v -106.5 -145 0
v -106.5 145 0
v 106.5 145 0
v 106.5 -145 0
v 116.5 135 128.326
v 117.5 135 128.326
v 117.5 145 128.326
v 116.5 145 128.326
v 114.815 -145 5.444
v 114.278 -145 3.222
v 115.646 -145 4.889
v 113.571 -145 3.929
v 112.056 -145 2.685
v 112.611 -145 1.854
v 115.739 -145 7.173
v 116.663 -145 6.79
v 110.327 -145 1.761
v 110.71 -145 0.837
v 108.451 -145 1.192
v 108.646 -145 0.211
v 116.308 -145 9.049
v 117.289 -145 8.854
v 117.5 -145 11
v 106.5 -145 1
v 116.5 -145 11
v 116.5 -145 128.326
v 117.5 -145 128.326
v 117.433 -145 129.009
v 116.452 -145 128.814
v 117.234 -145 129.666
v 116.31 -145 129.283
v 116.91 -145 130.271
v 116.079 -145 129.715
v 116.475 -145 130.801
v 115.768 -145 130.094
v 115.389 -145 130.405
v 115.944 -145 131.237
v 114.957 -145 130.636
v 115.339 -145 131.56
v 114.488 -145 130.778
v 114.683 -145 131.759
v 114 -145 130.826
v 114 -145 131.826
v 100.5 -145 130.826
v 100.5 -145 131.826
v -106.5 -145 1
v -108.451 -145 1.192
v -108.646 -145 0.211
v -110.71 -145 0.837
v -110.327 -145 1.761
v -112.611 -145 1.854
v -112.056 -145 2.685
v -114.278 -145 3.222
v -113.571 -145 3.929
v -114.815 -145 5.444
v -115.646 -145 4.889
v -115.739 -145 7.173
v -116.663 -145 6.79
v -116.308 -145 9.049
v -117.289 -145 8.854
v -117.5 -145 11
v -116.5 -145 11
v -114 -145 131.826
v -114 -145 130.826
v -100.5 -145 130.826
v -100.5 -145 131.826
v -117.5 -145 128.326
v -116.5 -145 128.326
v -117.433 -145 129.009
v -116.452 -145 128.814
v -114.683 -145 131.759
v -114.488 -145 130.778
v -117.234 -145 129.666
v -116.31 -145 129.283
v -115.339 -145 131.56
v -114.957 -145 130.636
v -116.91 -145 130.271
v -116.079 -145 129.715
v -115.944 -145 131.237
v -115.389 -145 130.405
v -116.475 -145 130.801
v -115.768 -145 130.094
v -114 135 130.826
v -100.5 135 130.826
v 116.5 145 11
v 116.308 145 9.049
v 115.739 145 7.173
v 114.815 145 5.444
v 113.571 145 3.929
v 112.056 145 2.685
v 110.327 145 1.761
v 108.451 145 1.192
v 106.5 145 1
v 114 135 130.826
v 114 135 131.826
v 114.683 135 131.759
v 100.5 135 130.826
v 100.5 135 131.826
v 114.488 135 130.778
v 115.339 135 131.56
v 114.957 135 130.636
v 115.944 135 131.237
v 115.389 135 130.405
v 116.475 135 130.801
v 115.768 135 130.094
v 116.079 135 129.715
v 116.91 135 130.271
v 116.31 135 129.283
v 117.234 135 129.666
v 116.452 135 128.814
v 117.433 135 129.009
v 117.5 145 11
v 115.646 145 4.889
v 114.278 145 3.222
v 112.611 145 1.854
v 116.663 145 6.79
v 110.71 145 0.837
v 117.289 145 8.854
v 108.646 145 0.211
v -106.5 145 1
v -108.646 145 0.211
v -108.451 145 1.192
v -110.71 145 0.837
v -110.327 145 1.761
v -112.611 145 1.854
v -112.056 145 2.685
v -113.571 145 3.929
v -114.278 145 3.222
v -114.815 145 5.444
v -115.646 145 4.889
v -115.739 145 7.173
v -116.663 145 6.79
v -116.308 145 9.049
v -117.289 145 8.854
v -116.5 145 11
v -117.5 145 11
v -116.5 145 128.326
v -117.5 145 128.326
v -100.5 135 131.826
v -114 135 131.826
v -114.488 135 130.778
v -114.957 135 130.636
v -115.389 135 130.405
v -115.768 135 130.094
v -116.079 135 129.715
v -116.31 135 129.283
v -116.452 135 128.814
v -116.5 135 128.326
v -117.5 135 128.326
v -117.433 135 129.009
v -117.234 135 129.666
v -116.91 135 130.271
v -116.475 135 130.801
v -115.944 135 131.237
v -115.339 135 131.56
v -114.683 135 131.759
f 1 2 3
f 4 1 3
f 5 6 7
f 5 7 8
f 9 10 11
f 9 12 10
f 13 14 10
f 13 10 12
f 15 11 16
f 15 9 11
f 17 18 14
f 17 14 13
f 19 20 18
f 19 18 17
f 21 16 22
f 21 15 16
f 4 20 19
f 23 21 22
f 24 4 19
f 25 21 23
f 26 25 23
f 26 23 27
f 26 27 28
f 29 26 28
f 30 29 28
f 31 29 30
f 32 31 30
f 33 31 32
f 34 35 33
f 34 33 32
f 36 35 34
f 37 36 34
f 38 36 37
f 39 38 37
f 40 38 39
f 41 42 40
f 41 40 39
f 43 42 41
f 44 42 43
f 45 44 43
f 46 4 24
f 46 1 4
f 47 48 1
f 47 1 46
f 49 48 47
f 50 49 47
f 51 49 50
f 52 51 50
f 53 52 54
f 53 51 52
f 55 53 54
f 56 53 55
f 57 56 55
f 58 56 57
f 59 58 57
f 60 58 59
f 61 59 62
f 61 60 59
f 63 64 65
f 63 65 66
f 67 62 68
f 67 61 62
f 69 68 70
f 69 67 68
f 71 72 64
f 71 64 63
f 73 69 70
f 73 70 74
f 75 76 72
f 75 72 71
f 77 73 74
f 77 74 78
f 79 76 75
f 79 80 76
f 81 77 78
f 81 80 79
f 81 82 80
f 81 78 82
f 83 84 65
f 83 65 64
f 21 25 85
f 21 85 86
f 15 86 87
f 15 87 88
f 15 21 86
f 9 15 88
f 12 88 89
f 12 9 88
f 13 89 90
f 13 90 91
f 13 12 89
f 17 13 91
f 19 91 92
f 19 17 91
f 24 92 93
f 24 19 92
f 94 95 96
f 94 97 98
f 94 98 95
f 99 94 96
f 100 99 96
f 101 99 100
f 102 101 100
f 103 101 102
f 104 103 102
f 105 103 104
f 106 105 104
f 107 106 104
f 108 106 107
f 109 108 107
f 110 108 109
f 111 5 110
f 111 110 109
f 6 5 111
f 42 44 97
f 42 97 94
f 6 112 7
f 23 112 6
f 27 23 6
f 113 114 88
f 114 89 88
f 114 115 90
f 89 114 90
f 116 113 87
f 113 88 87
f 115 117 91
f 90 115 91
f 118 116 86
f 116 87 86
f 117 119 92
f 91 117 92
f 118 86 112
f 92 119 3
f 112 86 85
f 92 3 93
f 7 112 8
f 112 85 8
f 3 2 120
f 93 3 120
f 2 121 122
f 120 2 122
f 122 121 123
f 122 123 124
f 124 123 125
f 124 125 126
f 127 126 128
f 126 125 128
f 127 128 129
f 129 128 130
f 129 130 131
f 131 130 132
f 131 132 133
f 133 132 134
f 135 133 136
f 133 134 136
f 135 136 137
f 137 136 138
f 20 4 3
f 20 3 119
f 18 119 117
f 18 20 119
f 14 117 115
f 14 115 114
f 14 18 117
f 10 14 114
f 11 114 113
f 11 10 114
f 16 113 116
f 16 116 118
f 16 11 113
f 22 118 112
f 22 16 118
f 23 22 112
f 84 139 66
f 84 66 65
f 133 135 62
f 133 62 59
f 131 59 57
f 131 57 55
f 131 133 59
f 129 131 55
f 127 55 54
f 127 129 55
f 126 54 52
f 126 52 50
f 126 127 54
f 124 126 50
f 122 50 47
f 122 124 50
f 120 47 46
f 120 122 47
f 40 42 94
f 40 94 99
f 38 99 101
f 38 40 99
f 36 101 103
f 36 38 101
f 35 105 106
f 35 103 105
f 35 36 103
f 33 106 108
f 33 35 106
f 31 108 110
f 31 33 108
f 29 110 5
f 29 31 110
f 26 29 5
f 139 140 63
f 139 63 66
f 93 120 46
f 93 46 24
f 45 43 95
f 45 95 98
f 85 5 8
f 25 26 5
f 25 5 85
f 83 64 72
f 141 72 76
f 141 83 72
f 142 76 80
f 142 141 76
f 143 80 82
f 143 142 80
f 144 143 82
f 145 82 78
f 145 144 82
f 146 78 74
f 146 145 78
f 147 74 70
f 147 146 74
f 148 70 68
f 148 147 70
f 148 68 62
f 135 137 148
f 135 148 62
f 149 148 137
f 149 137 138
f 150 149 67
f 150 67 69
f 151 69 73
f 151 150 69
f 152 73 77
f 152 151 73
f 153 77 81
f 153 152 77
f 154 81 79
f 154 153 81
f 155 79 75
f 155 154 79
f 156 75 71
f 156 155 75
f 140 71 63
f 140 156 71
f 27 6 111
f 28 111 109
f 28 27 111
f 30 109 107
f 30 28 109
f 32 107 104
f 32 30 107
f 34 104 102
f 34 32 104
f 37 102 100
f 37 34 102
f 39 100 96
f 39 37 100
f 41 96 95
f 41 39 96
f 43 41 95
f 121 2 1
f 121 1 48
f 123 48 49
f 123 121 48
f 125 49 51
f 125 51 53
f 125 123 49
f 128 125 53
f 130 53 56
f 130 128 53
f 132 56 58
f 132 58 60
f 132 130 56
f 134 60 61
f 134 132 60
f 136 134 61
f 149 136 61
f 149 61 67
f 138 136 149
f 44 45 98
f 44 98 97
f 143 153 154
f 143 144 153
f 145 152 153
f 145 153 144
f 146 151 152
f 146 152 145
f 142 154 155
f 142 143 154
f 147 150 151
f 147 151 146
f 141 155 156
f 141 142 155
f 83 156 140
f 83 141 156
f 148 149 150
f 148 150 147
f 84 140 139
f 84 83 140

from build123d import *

# Parameters (mm, degrees)
SKETCH1_W                      = 235
SKETCH1_H                      = 1
BASE_FLANGE1_DEPTH             = 145
EDGE_FLANGE2_STRIP_W           = 24
EDGE_FLANGE2_STRIP_H           = 1
EDGE_FLANGE2_STRIP_CUT_DEPTH   = 290
EDGE_FLANGE2_STRIP_2_W         = 24
EDGE_FLANGE2_STRIP_2_H         = 1
EDGE_FLANGE2_STRIP_CUT_2_DEPTH = 290
EDGE_FLANGE2_DEPTH             = 290
EDGE_FLANGE2_BEND_DEPTH        = 290
EDGE_FLANGE3_STRIP_W           = 9
EDGE_FLANGE3_STRIP_H           = 1
EDGE_FLANGE3_STRIP_CUT_DEPTH   = 290
EDGE_FLANGE3_STRIP_2_W         = 9
EDGE_FLANGE3_STRIP_2_H         = 1
EDGE_FLANGE3_STRIP_CUT_2_DEPTH = 290
EDGE_FLANGE3_DEPTH             = 290
EDGE_FLANGE3_BEND_DEPTH        = 290
CUT_EXTRUDE1_START             = -10
CUT_EXTRUDE1_DEPTH             = 10


# Read off the part's stored shape, not the designer's step: Cut-Extrude1
# Sheet-metal steps are written as plain solids
with BuildPart() as part:
    # Sketch1 → Base-Flange1 (new, symmetric)
    with BuildSketch(Plane(origin=(0, 0, 0), x_dir=(1, 0, 0), z_dir=(0, 1, 0))):
        with Locations((0, -0.5)):
            Rectangle(SKETCH1_W, SKETCH1_H)
    extrude(amount=BASE_FLANGE1_DEPTH, both=True)

    # Edge-Flange2 strip (across the edge) → Edge-Flange2 strip cut (cut)
    with BuildSketch(Plane(origin=(-117.5, 145, 1), x_dir=(1, 0, 0), z_dir=(0, -1, 0))):
        with Locations((-1, -0.5)):
            Rectangle(EDGE_FLANGE2_STRIP_W, EDGE_FLANGE2_STRIP_H)
    extrude(amount=EDGE_FLANGE2_STRIP_CUT_DEPTH, mode=Mode.SUBTRACT)

    # Edge-Flange2 strip 2 (across the edge) → Edge-Flange2 strip cut 2 (cut)
    with BuildSketch(Plane(origin=(117.5, -145, 1), x_dir=(-1, 0, 0), z_dir=(0, 1, 0))):
        with Locations((-1, -0.5)):
            Rectangle(EDGE_FLANGE2_STRIP_2_W, EDGE_FLANGE2_STRIP_2_H)
    extrude(amount=EDGE_FLANGE2_STRIP_CUT_2_DEPTH, mode=Mode.SUBTRACT)

    # Edge-Flange2 section (across the edge) → Edge-Flange2 (add)
    with BuildSketch(Plane(origin=(-117.5, 145, 1), x_dir=(1, 0, 0), z_dir=(0, -1, 0))):
        with BuildLine():
            Line((0, 10), (0, 130.826439119))
            Line((0, 130.826439119), (1, 130.826439119))
            Line((1, 130.826439119), (1, 10))
            ThreePointArc((1, 10), (3.928932188, 2.928932188), (11, 0))
            Line((11, 0), (11, -1))
            ThreePointArc((11, -1), (3.221825407, 2.221825407), (0, 10))
        make_face()
    extrude(amount=EDGE_FLANGE2_DEPTH)

    # Edge-Flange2 section 2 (across the edge) → Edge-Flange2 bend (add)
    with BuildSketch(Plane(origin=(117.5, -145, 1), x_dir=(-1, 0, 0), z_dir=(0, 1, 0))):
        with BuildLine():
            Line((0, 10), (0, 130.826439119))
            Line((0, 130.826439119), (1, 130.826439119))
            Line((1, 130.826439119), (1, 10))
            ThreePointArc((1, 10), (3.928932188, 2.928932188), (11, 0))
            Line((11, 0), (11, -1))
            ThreePointArc((11, -1), (3.221825407, 2.221825407), (0, 10))
        make_face()
    extrude(amount=EDGE_FLANGE2_BEND_DEPTH)

    # Edge-Flange3 strip (across the edge) → Edge-Flange3 strip cut (cut)
    with BuildSketch(Plane(origin=(-116.5, 145, 131.826439119), x_dir=(0, 0, -1), z_dir=(0, -1, 0))):
        with Locations((-1, -0.5)):
            Rectangle(EDGE_FLANGE3_STRIP_W, EDGE_FLANGE3_STRIP_H)
    extrude(amount=EDGE_FLANGE3_STRIP_CUT_DEPTH, mode=Mode.SUBTRACT)

    # Edge-Flange3 strip 2 (across the edge) → Edge-Flange3 strip cut 2 (cut)
    with BuildSketch(Plane(origin=(116.5, -145, 131.826439119), x_dir=(0, 0, -1), z_dir=(0, 1, 0))):
        with Locations((-1, -0.5)):
            Rectangle(EDGE_FLANGE3_STRIP_2_W, EDGE_FLANGE3_STRIP_2_H)
    extrude(amount=EDGE_FLANGE3_STRIP_CUT_2_DEPTH, mode=Mode.SUBTRACT)

    # Edge-Flange3 section (across the edge) → Edge-Flange3 (add)
    with BuildSketch(Plane(origin=(-116.5, 145, 131.826439119), x_dir=(0, 0, -1), z_dir=(0, -1, 0))):
        with BuildLine():
            Line((0, 2.5), (0, 16))
            Line((0, 16), (1, 16))
            Line((1, 16), (1, 2.5))
            ThreePointArc((1, 2.5), (1.732233047, 0.732233047), (3.5, 0))
            Line((3.5, 0), (3.5, -1))
            ThreePointArc((3.5, -1), (1.025126266, 0.025126266), (0, 2.5))
        make_face()
    extrude(amount=EDGE_FLANGE3_DEPTH)

    # Edge-Flange3 section 2 (across the edge) → Edge-Flange3 bend (add)
    with BuildSketch(Plane(origin=(116.5, -145, 131.826439119), x_dir=(0, 0, -1), z_dir=(0, 1, 0))):
        with BuildLine():
            Line((0, 2.5), (0, 16))
            Line((0, 16), (1, 16))
            Line((1, 16), (1, 2.5))
            ThreePointArc((1, 2.5), (1.732233047, 0.732233047), (3.5, 0))
            Line((3.5, 0), (3.5, -1))
            ThreePointArc((3.5, -1), (1.025126266, 0.025126266), (0, 2.5))
        make_face()
    extrude(amount=EDGE_FLANGE3_BEND_DEPTH)

    # Cut-Extrude1 outline → Cut-Extrude1 (cut)
    with BuildSketch(Plane(origin=(0, 145, 0), x_dir=(1, 0, 0), z_dir=(0, 1, 0)).offset(CUT_EXTRUDE1_START)):
        with BuildLine():
            ThreePointArc((114, -131.826439119), (116.474873734, -130.801312853), (117.5, -128.326439119))
            Line((117.5, -128.326439119), (116.5, -128.326439119))
            ThreePointArc((116.5, -128.326439119), (115.767766953, -130.094206072), (114, -130.826439119))
            Line((114, -130.826439119), (100.5, -130.826439119))
            Line((100.5, -130.826439119), (100.5, -131.826439119))
            Line((100.5, -131.826439119), (114, -131.826439119))
        make_face()
        with BuildLine():
            ThreePointArc((-114, -130.826439119), (-115.767766953, -130.094206072), (-116.5, -128.326439119))
            Line((-116.5, -128.326439119), (-117.5, -128.326439119))
            ThreePointArc((-117.5, -128.326439119), (-116.474873734, -130.801312853), (-114, -131.826439119))
            Line((-114, -131.826439119), (-100.5, -131.826439119))
            Line((-100.5, -131.826439119), (-100.5, -130.826439119))
            Line((-100.5, -130.826439119), (-114, -130.826439119))
        make_face()
    extrude(amount=CUT_EXTRUDE1_DEPTH, mode=Mode.SUBTRACT)


solid = part.part
